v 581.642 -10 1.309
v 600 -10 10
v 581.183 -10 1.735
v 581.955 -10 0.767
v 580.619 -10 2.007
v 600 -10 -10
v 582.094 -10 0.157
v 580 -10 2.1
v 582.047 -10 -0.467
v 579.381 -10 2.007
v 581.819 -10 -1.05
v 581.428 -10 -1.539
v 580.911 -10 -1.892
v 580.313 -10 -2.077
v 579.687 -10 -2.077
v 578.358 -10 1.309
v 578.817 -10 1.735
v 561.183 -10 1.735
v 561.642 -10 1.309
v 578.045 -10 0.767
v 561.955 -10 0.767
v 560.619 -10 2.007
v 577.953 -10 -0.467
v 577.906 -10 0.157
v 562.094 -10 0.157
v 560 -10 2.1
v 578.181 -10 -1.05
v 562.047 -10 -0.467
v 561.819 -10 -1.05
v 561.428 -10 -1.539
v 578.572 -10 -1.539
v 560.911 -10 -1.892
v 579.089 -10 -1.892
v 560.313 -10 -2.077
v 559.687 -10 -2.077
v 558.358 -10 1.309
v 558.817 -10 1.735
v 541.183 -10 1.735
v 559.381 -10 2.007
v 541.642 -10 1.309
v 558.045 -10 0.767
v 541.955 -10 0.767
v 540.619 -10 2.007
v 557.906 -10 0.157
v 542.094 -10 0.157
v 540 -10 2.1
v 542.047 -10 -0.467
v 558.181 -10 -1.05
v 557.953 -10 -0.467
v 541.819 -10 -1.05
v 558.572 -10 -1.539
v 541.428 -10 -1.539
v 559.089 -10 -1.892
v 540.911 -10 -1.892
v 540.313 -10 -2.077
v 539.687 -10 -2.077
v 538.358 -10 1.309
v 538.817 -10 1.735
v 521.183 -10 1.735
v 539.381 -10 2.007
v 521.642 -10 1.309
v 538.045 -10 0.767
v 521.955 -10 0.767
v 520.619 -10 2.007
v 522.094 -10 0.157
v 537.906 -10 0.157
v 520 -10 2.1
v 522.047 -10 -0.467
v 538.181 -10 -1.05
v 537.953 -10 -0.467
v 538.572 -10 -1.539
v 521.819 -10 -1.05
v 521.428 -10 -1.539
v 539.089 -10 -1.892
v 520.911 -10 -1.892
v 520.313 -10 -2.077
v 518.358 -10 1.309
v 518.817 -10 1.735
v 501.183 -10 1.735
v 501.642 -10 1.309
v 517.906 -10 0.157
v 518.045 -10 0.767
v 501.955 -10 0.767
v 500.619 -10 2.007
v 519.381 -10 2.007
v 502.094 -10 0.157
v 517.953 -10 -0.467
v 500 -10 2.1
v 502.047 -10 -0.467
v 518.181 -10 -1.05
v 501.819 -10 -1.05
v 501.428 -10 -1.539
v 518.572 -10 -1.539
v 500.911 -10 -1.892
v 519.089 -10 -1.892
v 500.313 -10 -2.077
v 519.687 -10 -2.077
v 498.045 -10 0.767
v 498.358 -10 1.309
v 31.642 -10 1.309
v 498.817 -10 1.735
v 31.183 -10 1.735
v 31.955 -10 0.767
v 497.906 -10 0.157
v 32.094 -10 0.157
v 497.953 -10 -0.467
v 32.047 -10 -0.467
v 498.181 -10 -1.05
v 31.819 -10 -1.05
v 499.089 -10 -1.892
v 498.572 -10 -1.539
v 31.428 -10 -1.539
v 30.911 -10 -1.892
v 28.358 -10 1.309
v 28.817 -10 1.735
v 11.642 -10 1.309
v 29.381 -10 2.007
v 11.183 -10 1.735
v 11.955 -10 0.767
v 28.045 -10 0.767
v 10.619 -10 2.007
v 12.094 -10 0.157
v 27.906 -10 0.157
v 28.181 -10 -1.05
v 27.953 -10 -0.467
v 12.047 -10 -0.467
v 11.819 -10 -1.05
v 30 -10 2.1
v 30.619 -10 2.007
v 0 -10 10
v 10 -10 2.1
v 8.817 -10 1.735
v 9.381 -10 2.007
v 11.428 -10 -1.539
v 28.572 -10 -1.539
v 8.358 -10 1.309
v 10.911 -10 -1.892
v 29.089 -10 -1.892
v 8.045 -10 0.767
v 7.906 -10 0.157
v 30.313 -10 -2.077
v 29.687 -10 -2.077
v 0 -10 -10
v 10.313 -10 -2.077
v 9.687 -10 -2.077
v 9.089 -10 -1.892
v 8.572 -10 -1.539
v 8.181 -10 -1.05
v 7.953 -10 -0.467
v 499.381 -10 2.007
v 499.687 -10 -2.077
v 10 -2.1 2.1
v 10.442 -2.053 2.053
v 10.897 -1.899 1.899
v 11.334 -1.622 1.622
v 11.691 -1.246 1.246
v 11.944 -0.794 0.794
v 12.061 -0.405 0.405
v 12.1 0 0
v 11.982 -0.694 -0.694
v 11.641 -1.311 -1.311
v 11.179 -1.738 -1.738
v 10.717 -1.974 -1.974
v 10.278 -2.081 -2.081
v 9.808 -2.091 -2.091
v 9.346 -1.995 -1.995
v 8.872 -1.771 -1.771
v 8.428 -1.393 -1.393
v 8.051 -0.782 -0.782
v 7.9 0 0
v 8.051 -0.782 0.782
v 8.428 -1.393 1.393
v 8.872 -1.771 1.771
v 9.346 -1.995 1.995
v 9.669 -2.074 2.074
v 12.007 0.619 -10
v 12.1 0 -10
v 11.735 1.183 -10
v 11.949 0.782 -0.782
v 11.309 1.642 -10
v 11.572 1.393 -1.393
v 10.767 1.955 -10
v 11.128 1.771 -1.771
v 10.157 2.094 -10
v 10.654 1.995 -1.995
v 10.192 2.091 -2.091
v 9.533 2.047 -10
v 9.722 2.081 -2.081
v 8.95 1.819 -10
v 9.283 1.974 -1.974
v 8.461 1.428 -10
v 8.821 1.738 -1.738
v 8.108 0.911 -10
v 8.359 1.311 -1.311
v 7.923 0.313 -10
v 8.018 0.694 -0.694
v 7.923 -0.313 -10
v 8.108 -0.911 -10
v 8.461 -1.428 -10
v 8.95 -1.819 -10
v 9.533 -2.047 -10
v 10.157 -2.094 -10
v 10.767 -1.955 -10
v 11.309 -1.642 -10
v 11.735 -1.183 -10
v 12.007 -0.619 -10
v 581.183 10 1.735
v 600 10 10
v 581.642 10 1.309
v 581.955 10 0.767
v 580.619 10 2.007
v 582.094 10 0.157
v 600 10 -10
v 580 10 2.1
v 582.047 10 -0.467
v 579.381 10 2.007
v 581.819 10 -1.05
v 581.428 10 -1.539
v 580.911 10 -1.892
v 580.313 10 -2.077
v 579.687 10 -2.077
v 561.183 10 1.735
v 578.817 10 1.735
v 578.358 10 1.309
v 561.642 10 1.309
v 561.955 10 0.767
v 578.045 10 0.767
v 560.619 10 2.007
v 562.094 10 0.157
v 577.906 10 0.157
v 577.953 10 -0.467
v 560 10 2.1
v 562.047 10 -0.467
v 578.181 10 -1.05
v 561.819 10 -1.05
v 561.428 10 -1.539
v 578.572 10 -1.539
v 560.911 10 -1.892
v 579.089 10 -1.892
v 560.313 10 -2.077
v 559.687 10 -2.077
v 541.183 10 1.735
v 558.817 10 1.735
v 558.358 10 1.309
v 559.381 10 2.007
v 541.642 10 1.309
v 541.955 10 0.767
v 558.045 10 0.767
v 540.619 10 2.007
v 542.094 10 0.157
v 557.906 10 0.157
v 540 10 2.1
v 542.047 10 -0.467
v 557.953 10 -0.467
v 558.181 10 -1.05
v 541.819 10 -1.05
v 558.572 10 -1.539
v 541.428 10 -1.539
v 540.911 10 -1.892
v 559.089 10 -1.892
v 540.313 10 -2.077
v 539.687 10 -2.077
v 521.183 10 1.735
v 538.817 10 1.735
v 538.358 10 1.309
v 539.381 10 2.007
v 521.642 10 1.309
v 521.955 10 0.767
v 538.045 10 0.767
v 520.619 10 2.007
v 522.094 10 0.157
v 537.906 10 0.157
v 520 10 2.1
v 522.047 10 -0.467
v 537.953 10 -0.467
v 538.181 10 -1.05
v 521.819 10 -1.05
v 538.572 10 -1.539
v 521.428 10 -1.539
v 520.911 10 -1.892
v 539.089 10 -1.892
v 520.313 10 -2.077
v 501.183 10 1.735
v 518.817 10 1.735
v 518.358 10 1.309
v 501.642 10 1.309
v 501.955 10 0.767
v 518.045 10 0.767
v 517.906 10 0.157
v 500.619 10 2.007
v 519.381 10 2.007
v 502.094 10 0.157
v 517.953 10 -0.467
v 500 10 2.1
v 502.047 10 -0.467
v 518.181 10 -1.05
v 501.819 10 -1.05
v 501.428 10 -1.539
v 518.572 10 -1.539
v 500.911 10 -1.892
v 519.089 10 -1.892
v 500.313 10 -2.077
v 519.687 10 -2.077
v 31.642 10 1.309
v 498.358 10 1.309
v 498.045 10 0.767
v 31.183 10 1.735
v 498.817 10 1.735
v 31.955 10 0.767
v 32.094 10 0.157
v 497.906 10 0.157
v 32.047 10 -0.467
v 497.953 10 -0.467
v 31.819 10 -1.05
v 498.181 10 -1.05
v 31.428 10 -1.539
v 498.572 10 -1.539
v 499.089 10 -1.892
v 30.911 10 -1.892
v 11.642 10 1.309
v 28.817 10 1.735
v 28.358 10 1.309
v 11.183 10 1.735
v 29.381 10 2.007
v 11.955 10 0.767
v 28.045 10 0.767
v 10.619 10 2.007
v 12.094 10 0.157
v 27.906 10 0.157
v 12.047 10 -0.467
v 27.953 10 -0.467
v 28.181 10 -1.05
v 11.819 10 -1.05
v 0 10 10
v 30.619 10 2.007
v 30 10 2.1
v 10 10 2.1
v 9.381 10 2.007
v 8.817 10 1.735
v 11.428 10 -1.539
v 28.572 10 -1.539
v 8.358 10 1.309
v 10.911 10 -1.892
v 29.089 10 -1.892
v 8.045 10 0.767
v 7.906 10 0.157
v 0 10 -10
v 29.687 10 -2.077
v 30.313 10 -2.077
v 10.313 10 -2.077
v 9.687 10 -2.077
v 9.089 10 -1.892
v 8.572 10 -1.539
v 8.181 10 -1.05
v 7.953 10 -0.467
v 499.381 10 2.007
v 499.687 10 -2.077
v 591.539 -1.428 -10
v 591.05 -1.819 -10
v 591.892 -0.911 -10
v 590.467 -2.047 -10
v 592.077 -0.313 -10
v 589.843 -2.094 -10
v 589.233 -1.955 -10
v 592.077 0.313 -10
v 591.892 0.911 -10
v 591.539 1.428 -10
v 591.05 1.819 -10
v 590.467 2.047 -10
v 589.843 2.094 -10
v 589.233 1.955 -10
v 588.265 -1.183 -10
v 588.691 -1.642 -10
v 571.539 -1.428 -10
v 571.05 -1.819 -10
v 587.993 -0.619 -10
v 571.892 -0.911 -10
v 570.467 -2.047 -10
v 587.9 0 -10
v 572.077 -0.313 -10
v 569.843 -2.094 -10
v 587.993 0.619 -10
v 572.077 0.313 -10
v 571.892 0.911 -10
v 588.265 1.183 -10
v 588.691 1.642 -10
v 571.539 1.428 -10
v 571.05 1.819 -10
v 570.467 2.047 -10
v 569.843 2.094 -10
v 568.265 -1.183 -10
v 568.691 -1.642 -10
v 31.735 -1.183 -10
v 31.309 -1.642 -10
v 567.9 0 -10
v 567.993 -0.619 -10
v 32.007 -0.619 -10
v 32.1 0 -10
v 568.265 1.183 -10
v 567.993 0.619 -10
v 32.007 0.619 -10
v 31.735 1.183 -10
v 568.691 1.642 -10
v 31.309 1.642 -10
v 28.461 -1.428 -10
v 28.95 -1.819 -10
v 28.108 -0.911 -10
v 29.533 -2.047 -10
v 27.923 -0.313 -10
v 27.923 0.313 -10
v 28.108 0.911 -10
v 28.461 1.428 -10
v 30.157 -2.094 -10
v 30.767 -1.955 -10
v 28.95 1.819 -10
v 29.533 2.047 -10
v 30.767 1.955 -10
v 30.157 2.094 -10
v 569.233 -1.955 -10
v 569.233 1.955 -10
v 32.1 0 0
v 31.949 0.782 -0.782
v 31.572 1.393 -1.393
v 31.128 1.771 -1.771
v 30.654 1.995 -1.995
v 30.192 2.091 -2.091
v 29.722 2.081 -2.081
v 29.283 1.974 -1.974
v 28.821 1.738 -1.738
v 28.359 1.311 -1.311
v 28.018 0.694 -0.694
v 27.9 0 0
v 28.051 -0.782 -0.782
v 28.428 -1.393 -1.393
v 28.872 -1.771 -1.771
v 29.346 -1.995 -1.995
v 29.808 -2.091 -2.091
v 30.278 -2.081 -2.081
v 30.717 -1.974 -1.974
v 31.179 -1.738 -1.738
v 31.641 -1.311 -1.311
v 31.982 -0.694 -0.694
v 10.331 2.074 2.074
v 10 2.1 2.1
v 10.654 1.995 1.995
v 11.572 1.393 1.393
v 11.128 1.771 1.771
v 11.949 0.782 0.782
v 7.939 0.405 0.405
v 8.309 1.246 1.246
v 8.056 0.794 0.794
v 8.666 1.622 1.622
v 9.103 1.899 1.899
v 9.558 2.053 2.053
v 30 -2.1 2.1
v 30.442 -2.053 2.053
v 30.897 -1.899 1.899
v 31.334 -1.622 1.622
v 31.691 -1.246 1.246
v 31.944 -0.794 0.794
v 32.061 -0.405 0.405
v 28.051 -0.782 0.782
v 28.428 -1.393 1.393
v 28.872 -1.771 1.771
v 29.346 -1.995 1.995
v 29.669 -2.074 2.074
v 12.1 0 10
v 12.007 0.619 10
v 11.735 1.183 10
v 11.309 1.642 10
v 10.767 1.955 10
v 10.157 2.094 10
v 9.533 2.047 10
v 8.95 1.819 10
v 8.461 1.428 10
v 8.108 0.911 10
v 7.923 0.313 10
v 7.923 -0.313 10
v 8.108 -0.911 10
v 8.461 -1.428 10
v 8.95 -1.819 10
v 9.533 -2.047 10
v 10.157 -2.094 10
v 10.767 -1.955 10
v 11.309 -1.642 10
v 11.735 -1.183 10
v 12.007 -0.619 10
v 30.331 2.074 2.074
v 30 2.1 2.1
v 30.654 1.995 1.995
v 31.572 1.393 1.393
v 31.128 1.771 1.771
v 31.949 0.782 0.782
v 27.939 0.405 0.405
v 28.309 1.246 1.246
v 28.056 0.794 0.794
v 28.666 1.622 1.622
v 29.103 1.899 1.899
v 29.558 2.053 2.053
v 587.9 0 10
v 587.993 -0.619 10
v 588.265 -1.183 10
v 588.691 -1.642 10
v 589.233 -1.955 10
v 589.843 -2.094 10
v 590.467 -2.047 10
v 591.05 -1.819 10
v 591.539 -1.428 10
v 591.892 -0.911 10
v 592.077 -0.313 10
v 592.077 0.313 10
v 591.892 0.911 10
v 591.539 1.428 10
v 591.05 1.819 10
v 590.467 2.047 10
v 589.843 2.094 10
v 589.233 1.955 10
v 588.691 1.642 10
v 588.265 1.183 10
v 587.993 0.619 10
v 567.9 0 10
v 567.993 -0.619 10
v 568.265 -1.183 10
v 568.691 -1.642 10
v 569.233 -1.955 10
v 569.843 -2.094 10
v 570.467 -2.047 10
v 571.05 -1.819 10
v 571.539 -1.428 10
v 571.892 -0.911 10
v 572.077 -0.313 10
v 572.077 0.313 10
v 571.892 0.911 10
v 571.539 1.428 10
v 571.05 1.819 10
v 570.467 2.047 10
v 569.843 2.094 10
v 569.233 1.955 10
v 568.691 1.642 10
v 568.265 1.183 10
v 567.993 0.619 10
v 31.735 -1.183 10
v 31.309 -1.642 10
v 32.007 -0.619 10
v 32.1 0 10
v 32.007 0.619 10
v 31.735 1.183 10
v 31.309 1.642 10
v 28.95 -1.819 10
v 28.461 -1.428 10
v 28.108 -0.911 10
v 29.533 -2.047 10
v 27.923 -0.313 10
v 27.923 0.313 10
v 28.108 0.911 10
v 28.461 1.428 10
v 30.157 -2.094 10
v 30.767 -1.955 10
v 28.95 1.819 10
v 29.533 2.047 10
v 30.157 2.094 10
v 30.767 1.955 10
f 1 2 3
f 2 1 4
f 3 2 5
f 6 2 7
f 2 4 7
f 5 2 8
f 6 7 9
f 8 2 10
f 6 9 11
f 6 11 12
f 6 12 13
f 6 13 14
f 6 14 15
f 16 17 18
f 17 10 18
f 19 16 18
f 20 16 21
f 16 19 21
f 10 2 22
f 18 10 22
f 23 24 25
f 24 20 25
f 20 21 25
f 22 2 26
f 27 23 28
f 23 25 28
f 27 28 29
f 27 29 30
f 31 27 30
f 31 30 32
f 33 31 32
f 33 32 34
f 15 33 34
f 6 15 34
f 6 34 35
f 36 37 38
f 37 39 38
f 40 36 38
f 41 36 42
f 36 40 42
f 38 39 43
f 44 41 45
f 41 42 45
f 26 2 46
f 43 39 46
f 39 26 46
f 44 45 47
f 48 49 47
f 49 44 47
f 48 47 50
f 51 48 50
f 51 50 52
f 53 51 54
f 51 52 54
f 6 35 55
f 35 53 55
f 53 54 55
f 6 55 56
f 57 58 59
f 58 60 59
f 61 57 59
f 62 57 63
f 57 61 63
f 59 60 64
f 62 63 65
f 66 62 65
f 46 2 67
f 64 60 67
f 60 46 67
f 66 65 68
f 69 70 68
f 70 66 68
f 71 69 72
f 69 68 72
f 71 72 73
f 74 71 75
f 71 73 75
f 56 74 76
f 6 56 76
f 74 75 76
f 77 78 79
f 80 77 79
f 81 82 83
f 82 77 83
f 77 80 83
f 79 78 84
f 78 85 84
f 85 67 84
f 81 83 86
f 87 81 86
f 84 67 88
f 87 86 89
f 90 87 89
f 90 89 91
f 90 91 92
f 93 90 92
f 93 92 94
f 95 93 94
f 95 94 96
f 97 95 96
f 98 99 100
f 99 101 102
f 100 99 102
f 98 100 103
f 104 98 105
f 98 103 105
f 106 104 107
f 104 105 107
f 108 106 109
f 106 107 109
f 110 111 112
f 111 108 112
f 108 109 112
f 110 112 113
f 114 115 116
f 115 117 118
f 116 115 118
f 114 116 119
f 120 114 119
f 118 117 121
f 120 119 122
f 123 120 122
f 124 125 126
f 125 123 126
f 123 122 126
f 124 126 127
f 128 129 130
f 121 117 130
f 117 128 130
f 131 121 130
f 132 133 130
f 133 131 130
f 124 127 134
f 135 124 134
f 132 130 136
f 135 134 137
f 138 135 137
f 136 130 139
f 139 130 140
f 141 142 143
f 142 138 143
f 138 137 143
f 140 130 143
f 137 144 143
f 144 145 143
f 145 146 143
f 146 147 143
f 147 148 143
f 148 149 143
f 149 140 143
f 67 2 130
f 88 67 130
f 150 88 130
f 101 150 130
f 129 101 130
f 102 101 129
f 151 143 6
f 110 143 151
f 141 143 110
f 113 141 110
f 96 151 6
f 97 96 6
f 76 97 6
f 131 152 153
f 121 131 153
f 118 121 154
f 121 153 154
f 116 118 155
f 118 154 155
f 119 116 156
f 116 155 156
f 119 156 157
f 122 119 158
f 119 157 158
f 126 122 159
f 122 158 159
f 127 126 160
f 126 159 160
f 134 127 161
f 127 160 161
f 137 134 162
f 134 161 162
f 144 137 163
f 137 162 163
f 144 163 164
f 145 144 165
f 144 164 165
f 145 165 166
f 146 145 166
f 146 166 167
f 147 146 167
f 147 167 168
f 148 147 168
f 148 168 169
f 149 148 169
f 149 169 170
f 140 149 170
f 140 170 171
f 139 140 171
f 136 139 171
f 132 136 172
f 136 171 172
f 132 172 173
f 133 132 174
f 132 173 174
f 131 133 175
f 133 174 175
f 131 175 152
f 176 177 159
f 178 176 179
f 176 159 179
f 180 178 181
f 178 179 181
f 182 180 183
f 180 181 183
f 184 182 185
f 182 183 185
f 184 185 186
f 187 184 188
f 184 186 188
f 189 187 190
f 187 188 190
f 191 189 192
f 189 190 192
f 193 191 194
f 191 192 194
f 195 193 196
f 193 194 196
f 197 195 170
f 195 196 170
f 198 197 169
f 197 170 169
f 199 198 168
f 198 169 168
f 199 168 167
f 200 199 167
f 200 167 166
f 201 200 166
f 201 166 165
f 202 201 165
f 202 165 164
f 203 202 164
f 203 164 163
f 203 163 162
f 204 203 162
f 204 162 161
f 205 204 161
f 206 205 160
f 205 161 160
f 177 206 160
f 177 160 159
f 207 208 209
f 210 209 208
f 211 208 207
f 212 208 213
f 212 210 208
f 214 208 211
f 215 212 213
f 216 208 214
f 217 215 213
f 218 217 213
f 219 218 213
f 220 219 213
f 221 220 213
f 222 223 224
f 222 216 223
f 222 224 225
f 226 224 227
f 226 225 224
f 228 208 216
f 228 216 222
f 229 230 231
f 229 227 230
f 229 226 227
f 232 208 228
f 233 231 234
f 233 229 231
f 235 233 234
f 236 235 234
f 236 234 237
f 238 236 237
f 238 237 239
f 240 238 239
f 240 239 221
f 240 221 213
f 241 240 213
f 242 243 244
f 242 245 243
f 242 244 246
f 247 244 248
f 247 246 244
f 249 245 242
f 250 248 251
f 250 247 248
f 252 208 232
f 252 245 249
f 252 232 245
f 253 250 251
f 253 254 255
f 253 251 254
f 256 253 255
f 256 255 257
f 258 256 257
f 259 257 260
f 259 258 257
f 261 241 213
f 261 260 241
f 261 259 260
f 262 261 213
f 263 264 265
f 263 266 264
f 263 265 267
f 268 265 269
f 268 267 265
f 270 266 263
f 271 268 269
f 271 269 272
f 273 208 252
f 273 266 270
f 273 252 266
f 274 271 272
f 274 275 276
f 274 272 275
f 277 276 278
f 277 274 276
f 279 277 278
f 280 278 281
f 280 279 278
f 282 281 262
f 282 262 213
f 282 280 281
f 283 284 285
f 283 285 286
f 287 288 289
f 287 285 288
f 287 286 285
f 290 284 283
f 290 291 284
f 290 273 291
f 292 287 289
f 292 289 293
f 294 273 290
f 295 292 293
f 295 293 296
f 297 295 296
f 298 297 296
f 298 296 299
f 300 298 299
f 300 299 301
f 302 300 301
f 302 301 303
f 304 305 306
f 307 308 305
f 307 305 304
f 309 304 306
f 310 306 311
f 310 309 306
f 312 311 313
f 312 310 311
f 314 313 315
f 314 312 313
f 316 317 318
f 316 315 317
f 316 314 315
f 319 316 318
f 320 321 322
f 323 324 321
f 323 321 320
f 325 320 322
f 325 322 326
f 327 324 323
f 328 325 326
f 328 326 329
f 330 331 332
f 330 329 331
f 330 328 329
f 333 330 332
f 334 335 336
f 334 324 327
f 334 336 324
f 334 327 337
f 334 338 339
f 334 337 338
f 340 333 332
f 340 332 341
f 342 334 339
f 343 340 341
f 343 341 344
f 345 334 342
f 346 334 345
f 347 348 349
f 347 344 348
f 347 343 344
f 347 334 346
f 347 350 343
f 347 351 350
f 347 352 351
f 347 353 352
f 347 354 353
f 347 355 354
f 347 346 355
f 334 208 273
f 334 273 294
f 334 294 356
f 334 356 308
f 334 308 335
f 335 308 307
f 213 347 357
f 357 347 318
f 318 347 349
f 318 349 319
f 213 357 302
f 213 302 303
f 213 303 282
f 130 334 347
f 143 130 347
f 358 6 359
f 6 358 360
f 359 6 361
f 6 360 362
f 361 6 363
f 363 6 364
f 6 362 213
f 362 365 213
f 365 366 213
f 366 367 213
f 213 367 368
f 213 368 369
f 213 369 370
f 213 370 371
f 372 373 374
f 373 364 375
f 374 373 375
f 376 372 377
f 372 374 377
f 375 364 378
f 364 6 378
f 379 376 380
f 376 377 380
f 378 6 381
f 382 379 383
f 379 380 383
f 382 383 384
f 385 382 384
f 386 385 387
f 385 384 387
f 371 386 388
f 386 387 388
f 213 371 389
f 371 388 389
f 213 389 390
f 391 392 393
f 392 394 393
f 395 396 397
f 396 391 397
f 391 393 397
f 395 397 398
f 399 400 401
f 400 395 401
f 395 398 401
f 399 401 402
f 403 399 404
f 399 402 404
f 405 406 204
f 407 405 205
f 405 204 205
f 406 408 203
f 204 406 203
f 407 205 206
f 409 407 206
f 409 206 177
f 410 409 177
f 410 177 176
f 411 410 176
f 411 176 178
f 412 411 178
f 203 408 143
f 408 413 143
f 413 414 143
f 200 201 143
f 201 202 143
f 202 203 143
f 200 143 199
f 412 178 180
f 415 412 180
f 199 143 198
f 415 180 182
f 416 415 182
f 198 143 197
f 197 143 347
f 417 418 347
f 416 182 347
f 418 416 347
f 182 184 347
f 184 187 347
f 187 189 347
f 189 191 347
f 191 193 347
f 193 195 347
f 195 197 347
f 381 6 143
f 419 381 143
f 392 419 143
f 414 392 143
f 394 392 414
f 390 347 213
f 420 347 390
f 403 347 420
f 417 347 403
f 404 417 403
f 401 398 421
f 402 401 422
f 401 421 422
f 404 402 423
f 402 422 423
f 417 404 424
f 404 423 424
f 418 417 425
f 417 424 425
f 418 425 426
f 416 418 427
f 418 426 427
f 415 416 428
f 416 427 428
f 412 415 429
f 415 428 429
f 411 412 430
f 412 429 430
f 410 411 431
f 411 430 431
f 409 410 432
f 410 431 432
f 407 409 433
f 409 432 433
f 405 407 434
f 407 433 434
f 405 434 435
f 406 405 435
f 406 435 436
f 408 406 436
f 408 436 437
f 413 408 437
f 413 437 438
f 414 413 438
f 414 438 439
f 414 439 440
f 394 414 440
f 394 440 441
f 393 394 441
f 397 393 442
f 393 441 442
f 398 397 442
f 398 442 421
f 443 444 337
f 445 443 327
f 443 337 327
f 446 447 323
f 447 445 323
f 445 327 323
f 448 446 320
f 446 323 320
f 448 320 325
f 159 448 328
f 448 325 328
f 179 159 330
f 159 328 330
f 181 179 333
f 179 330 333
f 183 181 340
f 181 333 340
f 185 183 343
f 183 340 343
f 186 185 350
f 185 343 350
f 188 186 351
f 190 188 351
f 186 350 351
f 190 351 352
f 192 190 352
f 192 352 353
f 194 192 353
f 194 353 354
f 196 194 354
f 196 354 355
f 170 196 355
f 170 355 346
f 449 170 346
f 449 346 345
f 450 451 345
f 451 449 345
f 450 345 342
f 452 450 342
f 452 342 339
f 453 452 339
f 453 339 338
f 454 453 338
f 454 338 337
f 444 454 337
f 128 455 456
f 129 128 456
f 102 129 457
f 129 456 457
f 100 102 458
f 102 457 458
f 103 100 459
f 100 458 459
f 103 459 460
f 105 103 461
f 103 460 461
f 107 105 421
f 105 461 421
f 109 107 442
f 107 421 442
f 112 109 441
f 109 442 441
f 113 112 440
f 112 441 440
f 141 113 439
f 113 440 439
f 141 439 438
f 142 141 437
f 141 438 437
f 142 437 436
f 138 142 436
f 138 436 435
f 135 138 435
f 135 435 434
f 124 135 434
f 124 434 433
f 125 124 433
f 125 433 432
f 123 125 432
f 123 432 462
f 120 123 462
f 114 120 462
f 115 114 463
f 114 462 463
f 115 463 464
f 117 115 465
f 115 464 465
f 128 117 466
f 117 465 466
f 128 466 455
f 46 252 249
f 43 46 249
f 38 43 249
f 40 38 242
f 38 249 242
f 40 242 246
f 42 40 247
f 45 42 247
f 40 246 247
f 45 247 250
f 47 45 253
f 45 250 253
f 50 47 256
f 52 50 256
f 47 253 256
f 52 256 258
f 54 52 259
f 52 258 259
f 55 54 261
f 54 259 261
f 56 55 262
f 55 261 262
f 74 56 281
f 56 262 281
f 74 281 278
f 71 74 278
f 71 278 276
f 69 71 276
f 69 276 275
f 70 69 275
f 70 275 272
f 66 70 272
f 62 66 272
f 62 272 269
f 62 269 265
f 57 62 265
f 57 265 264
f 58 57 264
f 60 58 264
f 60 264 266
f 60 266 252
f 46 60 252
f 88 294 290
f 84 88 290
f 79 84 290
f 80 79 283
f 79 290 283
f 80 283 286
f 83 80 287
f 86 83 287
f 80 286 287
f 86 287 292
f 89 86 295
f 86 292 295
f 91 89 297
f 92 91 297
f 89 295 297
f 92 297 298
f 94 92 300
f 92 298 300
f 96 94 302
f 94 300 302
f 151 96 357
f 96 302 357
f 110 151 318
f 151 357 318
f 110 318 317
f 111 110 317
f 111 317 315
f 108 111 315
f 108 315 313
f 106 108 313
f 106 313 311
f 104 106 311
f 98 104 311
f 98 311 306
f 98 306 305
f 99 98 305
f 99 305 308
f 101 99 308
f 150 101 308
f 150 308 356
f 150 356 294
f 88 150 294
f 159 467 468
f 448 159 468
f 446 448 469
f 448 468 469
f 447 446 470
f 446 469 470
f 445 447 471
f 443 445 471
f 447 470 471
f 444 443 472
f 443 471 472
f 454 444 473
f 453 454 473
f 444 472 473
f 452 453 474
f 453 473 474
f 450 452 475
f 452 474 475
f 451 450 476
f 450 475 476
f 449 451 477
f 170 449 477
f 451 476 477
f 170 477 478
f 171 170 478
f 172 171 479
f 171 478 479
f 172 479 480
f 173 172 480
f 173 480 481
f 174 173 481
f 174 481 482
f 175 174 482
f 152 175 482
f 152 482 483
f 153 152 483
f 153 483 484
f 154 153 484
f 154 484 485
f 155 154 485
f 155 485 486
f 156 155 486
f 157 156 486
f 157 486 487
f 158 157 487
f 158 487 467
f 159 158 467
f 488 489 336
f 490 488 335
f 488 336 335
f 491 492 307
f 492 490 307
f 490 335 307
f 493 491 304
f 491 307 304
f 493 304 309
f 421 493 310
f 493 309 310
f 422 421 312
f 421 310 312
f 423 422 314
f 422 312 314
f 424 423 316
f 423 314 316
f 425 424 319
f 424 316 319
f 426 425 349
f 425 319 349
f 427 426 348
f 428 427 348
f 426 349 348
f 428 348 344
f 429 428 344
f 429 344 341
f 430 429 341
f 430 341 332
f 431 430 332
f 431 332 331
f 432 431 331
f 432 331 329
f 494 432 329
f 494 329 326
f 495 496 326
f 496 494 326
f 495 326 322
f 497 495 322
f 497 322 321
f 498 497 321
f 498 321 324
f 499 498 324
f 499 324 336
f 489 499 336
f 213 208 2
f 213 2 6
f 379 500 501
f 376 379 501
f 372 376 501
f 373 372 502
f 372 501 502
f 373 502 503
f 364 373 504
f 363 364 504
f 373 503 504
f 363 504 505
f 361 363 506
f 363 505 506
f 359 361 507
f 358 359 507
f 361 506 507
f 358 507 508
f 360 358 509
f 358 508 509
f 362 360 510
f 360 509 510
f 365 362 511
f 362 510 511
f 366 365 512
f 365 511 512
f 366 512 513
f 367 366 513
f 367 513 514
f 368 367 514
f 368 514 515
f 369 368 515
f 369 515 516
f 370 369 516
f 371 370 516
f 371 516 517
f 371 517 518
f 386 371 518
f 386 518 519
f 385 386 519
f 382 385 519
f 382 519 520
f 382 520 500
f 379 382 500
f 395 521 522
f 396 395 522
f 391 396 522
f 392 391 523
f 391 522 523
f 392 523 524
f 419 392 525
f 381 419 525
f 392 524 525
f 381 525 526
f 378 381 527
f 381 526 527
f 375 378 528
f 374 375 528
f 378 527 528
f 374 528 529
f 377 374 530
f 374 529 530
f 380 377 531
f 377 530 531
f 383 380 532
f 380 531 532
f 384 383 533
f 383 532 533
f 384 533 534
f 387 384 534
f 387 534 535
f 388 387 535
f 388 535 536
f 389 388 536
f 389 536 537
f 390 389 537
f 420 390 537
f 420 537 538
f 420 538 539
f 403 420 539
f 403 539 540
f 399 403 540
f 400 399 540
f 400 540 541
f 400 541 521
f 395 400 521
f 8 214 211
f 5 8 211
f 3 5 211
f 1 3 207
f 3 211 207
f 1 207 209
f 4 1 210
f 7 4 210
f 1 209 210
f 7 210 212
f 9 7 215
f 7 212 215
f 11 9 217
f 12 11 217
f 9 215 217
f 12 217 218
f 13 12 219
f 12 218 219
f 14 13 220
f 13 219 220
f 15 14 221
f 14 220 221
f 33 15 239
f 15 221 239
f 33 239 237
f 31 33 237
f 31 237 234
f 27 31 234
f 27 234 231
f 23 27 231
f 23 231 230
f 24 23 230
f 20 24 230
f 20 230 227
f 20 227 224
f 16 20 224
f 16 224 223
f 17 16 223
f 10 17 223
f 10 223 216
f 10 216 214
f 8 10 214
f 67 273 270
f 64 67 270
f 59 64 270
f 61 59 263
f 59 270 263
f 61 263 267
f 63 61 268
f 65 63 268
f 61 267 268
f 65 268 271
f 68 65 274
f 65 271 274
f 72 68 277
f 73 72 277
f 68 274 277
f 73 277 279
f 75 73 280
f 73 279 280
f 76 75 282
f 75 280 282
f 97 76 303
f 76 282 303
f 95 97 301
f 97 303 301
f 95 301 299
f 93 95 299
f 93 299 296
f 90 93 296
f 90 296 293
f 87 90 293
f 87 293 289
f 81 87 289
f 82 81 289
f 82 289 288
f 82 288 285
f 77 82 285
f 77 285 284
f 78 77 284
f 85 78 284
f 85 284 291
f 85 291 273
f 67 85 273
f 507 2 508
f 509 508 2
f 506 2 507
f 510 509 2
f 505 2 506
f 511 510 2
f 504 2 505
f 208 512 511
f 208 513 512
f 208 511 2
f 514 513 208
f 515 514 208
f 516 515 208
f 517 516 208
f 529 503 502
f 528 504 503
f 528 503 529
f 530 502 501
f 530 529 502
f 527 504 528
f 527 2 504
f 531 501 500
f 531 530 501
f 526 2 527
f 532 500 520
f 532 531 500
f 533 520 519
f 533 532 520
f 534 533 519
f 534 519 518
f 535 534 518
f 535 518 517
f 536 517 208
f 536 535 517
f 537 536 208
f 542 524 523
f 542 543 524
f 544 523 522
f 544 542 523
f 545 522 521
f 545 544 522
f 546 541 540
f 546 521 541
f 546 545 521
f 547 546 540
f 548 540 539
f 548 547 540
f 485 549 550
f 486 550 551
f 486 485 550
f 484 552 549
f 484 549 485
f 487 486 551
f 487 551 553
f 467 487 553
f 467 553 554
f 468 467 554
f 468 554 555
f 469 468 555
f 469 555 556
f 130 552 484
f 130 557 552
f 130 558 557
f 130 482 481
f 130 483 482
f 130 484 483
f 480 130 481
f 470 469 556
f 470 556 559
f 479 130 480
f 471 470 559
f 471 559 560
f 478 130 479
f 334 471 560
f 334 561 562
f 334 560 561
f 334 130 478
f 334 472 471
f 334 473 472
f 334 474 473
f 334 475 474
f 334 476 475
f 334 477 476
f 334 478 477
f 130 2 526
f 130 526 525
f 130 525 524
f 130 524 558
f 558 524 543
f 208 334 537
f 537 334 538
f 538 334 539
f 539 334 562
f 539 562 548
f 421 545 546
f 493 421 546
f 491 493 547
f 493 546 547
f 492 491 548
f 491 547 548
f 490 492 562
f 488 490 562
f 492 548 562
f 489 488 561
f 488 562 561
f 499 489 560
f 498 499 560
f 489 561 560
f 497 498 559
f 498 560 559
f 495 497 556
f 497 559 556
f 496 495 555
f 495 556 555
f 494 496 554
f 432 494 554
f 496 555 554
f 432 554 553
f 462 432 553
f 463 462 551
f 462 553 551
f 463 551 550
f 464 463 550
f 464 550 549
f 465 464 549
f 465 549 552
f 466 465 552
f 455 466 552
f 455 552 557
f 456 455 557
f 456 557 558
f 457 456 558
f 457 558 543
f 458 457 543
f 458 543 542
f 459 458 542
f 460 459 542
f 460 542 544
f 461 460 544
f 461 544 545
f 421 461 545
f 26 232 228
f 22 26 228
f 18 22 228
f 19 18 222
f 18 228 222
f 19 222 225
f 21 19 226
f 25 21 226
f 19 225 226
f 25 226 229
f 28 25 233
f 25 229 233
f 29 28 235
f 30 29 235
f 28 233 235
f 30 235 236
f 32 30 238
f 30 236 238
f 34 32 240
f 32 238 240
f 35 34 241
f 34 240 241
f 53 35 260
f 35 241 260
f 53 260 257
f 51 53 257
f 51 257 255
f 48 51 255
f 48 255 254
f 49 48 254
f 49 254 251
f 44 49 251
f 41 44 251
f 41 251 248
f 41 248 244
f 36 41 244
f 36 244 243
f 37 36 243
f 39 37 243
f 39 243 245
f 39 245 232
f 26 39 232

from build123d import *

# Parameters (mm, degrees)
SKETCH_1_W          = 20
SKETCH_1_H          = 20
EXTRUDE_1_DEPTH     = 600
SKETCH_2_R          = 2.1
CUT_EXTRUDE_1_DEPTH = 601.416522091
SKETCH_3_R          = 2.1
CUT_EXTRUDE_2_DEPTH = 601.416522091
SKETCH_4_R          = 2.1
CUT_EXTRUDE_3_DEPTH = 601.416522091


with BuildPart() as part:
    # 草图1 → 凸台-拉伸1 (new body)
    with BuildSketch(Plane(origin=(0, 0, 0), x_dir=(0, 0, -1), z_dir=(1, 0, 0))):
        Rectangle(SKETCH_1_W, SKETCH_1_H)
    extrude(amount=EXTRUDE_1_DEPTH)

    # 草图2 → 切除-拉伸1 (cut, through all)
    with BuildSketch(Plane.XY.offset(10)):
        with Locations((10, 0)):
            Circle(SKETCH_2_R)
        with Locations((30, 0)):
            Circle(SKETCH_2_R)
        with Locations(Location((570, 0, 0), (0, 0, 180))):
            Circle(SKETCH_2_R)
        with Locations(Location((590, 0, 0), (0, 0, 180))):
            Circle(SKETCH_2_R)
    extrude(amount=-CUT_EXTRUDE_1_DEPTH, mode=Mode.SUBTRACT)

    # 草图3 → 切除-拉伸2 (cut, through all)
    with BuildSketch(Plane(origin=(0, 10, 0), x_dir=(1, 0, 0), z_dir=(0, 1, 0))):
        with Locations(Location((10, 0, 0), (0, 0, 270))):
            Circle(SKETCH_3_R)
        with Locations(Location((30, 0, 0), (0, 0, 270))):
            Circle(SKETCH_3_R)
    extrude(amount=-CUT_EXTRUDE_2_DEPTH, mode=Mode.SUBTRACT)

    # 草图4 → 切除-拉伸3 (cut, through all)
    with BuildSketch(Plane(origin=(0, 10, 0), x_dir=(1, 0, 0), z_dir=(0, 1, 0))):
        with Locations(Location((580, 0, 0), (0, 0, 270))):
            Circle(SKETCH_4_R)
        with Locations(Location((560, 0, 0), (0, 0, 270))):
            Circle(SKETCH_4_R)
        with Locations(Location((540, 0, 0), (0, 0, 270))):
            Circle(SKETCH_4_R)
        with Locations(Location((520, 0, 0), (0, 0, 270))):
            Circle(SKETCH_4_R)
        with Locations(Location((500, 0, 0), (0, 0, 270))):
            Circle(SKETCH_4_R)
    extrude(amount=-CUT_EXTRUDE_3_DEPTH, mode=Mode.SUBTRACT)


solid = part.part
